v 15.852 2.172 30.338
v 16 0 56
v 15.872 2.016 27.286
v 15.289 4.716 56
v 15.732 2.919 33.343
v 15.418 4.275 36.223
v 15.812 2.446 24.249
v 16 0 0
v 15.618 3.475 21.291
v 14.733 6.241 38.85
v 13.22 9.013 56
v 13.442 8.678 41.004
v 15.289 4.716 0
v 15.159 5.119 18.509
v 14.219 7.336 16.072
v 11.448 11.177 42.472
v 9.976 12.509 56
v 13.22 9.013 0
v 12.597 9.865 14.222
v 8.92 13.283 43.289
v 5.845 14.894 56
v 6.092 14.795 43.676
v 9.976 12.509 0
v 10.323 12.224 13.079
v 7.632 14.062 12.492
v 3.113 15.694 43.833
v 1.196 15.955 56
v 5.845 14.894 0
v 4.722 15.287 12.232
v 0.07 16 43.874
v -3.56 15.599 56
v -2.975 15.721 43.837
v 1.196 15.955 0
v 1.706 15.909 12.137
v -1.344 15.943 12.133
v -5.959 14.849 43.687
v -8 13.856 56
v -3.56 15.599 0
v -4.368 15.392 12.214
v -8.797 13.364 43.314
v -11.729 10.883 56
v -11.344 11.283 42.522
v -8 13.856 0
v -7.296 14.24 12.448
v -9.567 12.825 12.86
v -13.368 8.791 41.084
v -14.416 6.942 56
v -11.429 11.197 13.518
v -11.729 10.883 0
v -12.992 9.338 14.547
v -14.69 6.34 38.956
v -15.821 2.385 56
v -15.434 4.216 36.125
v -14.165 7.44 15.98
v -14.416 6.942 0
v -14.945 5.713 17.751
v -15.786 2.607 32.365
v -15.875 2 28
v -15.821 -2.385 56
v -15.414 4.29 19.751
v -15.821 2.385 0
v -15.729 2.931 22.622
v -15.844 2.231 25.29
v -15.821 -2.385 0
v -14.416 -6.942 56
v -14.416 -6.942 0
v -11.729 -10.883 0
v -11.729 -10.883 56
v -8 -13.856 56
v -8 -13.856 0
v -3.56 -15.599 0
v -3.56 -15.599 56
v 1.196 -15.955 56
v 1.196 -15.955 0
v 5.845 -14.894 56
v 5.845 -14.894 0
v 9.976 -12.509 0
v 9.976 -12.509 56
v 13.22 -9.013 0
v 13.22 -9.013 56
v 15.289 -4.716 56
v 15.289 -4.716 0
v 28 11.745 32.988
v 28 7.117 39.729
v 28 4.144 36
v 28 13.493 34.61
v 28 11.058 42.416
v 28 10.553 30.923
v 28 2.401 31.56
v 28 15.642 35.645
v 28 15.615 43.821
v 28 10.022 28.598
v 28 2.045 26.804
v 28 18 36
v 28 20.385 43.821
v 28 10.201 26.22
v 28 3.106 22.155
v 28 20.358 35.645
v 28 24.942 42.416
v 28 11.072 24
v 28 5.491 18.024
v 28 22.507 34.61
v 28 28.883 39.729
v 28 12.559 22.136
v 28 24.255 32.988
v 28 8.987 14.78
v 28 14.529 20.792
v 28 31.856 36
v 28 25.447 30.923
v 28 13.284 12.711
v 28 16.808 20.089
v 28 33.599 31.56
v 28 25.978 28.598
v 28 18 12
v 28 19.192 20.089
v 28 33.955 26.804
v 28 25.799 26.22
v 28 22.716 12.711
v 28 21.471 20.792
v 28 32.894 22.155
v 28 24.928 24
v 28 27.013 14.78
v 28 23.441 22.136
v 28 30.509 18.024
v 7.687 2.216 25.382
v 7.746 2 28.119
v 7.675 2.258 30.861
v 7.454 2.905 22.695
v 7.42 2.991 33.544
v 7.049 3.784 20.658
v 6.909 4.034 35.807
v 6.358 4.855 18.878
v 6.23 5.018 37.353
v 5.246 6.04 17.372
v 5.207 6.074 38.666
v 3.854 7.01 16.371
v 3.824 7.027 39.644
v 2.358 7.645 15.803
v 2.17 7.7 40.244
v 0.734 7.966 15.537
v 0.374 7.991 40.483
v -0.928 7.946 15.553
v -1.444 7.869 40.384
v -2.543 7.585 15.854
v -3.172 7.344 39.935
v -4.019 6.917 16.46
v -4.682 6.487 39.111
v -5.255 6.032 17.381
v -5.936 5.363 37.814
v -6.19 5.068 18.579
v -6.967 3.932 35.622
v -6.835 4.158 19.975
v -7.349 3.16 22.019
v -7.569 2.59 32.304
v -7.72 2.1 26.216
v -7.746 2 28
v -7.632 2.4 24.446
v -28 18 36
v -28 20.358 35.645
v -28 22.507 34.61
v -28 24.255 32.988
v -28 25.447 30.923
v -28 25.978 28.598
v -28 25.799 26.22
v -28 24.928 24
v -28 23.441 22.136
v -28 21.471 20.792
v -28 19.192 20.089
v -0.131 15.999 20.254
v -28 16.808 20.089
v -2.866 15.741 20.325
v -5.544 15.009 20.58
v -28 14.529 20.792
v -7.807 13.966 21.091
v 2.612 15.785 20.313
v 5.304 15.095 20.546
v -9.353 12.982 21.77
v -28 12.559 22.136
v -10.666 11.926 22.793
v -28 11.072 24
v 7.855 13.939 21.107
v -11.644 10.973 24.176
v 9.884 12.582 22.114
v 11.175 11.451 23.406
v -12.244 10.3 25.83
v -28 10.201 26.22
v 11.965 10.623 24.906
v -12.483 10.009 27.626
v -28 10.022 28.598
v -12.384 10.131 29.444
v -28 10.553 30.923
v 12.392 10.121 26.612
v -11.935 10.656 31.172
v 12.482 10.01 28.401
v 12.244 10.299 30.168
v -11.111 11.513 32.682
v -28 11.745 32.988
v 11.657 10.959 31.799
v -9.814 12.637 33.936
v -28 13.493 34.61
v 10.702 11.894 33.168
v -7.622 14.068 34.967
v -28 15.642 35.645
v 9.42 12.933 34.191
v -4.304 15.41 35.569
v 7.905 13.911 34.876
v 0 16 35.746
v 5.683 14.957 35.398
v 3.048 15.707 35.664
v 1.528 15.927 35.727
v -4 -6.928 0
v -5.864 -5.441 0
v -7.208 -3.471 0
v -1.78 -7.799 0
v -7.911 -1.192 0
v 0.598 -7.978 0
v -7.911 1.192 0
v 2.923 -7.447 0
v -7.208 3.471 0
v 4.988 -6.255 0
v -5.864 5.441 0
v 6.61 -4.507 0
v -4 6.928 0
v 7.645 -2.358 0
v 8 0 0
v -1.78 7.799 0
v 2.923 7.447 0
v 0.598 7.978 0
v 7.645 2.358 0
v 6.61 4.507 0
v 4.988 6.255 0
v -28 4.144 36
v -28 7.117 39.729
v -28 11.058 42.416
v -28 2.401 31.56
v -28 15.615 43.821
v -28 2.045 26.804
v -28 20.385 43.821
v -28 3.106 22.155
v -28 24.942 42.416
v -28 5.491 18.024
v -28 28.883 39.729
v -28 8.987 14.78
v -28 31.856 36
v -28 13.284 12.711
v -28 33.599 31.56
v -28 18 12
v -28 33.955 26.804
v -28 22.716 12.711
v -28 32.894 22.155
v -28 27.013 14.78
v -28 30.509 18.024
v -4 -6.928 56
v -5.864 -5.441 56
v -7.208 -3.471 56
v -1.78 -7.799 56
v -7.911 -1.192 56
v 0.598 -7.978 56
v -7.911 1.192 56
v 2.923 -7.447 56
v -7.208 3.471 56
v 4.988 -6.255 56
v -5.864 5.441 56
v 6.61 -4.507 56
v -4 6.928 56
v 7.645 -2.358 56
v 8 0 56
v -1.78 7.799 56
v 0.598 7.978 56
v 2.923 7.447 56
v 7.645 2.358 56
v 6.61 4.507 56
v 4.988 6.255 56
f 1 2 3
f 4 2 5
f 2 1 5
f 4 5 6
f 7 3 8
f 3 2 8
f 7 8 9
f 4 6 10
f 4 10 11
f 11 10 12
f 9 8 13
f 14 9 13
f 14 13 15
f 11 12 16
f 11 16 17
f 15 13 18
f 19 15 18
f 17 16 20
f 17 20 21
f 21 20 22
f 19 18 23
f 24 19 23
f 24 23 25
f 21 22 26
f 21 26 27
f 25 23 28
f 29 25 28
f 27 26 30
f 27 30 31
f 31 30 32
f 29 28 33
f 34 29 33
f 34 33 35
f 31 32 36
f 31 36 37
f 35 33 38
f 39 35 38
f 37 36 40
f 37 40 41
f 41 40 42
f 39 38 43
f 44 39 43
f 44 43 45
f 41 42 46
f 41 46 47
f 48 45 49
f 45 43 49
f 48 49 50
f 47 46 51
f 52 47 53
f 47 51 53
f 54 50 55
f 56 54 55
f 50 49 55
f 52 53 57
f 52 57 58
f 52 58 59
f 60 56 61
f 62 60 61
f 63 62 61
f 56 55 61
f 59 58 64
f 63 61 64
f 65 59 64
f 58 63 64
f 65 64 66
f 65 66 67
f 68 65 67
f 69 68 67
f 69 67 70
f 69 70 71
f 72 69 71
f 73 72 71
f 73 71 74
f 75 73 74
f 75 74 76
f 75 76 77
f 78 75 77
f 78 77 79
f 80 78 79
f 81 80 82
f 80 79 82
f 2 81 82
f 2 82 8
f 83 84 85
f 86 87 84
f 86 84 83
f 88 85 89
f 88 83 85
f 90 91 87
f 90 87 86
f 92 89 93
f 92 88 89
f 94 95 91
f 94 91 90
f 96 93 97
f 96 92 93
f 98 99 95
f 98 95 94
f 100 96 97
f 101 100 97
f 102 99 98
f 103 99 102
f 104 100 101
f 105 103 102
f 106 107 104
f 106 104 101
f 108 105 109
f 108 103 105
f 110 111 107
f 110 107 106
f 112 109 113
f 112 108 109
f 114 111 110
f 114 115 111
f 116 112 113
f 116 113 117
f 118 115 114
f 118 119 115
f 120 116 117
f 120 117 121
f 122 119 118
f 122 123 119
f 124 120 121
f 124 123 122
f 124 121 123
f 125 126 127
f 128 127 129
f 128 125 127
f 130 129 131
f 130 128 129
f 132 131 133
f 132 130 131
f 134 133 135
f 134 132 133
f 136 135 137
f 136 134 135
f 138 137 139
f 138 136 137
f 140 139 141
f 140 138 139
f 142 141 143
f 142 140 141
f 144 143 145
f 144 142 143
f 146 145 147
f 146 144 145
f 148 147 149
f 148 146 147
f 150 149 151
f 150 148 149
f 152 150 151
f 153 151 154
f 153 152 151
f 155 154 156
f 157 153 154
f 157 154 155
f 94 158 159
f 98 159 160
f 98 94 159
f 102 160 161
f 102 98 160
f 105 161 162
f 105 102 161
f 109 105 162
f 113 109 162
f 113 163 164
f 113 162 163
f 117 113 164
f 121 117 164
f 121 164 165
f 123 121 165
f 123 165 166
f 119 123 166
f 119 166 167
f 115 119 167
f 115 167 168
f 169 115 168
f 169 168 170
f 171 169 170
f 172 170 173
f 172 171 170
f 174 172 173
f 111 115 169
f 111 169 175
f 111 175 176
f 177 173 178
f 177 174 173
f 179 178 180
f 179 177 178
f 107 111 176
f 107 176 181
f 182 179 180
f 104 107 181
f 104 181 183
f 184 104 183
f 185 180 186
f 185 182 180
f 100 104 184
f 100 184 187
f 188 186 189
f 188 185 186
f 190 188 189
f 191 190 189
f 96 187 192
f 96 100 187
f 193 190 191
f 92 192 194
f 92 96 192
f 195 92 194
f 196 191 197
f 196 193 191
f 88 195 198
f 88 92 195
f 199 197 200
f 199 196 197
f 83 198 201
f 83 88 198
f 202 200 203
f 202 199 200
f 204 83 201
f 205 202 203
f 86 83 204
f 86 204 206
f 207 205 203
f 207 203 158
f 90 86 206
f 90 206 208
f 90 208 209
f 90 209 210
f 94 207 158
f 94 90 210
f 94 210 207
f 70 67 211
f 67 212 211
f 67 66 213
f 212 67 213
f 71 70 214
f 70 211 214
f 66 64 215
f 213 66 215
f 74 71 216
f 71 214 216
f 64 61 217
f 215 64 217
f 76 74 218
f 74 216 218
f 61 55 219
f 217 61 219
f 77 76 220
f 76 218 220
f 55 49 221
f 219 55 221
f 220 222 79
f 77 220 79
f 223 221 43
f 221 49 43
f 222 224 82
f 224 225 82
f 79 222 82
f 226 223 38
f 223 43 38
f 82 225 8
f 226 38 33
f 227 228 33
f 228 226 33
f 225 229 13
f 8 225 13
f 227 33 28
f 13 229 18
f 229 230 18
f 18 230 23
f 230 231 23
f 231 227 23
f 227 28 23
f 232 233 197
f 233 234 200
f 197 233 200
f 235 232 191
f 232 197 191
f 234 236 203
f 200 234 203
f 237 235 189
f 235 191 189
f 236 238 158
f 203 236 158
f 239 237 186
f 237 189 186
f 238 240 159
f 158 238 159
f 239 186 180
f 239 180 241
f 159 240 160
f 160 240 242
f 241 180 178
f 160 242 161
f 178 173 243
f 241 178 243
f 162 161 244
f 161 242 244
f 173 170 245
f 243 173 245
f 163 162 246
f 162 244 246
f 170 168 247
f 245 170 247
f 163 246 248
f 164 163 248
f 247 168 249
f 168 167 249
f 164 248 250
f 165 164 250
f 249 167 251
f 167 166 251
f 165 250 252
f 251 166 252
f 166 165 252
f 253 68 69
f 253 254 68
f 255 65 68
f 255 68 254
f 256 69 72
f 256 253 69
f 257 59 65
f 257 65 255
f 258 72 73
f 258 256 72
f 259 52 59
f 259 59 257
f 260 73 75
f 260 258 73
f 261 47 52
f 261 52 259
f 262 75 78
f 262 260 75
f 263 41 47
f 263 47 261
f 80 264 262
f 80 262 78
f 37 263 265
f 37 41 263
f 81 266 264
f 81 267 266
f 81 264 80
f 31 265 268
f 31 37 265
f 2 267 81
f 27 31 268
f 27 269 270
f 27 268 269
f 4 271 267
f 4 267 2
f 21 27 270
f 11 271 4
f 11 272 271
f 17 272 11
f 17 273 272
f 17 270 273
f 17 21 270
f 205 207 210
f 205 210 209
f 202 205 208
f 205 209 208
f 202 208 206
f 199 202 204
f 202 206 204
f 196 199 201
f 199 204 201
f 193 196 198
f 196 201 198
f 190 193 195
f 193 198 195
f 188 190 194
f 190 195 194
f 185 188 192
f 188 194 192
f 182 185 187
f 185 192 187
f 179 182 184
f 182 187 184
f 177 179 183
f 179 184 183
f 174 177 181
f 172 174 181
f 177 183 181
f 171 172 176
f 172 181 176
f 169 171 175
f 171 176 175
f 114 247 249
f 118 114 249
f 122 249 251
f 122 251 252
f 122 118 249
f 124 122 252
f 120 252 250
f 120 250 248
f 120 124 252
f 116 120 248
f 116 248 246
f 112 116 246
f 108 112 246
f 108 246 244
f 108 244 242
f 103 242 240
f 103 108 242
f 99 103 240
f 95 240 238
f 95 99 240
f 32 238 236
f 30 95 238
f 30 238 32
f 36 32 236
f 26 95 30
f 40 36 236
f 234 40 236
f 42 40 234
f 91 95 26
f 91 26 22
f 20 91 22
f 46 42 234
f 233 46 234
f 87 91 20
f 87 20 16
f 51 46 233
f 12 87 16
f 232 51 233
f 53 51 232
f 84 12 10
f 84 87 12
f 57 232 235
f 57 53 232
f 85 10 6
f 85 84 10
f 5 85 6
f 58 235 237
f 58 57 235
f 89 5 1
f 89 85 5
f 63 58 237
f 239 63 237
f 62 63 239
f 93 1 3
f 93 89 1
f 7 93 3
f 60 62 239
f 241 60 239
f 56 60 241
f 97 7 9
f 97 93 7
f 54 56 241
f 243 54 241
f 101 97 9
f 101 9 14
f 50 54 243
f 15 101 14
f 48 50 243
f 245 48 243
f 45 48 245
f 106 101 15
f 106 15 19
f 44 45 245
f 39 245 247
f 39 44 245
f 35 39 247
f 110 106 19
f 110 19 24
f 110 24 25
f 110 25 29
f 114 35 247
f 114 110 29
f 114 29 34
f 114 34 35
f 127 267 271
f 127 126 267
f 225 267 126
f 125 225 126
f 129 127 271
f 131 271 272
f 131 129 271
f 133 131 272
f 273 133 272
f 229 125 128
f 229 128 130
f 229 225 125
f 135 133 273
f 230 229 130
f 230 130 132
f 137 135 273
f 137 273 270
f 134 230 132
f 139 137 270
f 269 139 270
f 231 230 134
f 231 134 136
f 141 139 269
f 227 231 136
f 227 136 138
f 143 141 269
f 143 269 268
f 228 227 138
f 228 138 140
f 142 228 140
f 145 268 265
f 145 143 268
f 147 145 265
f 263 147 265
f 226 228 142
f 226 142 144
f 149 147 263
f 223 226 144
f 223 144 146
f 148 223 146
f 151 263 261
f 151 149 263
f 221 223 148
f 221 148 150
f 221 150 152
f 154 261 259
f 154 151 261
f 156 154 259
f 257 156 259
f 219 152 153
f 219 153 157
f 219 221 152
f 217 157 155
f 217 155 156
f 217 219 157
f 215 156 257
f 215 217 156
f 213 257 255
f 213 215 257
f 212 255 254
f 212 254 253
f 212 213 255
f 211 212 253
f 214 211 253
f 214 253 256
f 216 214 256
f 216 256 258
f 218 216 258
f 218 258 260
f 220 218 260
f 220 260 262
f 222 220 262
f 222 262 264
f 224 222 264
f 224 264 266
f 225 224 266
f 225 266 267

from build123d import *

# Parameters (mm, degrees)
SKETCH2_R           = 16
SKETCH2_R_2         = 8
BOSS_EXTRUDE1_DEPTH = 56
BOSS_EXTRUDE2_DEPTH = 28
SKETCH4_R           = 8
CUT_EXTRUDE1_DEPTH  = 28
SKETCH5_R           = 8
CUT_EXTRUDE2_DEPTH  = 56


with BuildPart() as part:
    # Sketch2 → Boss-Extrude1 (new body)
    with BuildSketch(Plane.XY):
        Circle(SKETCH2_R)
        Circle(SKETCH2_R_2, mode=Mode.SUBTRACT)
    extrude(amount=BOSS_EXTRUDE1_DEPTH)

    # Sketch3 → Boss-Extrude2 (add, symmetric)
    with BuildSketch(Plane(origin=(0, 0, 0), x_dir=(0, 0, -1), z_dir=(1, 0, 0))):
        with BuildLine():
            ThreePointArc((-44, 18), (-28, 2), (-12, 18))
            Line((-12, 18), (-20, 18))
            ThreePointArc((-20, 18), (-28, 10), (-36, 18))
            Line((-36, 18), (-44, 18))
        make_face()
        with BuildLine():
            Line((-20, 18), (-12, 18))
            ThreePointArc((-12, 18), (-28, 34), (-44, 18))
            Line((-44, 18), (-36, 18))
            ThreePointArc((-36, 18), (-28, 26), (-20, 18))
        make_face()
        with BuildLine():
            ThreePointArc((-44, 18), (-28, 2), (-12, 18))
            Line((-12, 18), (-20, 18))
            ThreePointArc((-20, 18), (-28, 10), (-36, 18))
            Line((-36, 18), (-44, 18))
        make_face()
        with BuildLine():
            Line((-20, 18), (-12, 18))
            ThreePointArc((-12, 18), (-28, 34), (-44, 18))
            Line((-44, 18), (-36, 18))
            ThreePointArc((-36, 18), (-28, 26), (-20, 18))
        make_face()
    extrude(amount=BOSS_EXTRUDE2_DEPTH, both=True)

    # Sketch4 → Cut-Extrude1 (cut, symmetric)
    with BuildSketch(Plane(origin=(0, 0, 0), x_dir=(0, 0, -1), z_dir=(1, 0, 0))):
        with Locations((-28, 18)):
            Circle(SKETCH4_R)
    extrude(amount=CUT_EXTRUDE1_DEPTH, both=True, mode=Mode.SUBTRACT)

    # Sketch5 → Cut-Extrude2 (cut)
    with BuildSketch(Plane.XY):
        Circle(SKETCH5_R)
    extrude(amount=CUT_EXTRUDE2_DEPTH, mode=Mode.SUBTRACT)


solid = part.part
